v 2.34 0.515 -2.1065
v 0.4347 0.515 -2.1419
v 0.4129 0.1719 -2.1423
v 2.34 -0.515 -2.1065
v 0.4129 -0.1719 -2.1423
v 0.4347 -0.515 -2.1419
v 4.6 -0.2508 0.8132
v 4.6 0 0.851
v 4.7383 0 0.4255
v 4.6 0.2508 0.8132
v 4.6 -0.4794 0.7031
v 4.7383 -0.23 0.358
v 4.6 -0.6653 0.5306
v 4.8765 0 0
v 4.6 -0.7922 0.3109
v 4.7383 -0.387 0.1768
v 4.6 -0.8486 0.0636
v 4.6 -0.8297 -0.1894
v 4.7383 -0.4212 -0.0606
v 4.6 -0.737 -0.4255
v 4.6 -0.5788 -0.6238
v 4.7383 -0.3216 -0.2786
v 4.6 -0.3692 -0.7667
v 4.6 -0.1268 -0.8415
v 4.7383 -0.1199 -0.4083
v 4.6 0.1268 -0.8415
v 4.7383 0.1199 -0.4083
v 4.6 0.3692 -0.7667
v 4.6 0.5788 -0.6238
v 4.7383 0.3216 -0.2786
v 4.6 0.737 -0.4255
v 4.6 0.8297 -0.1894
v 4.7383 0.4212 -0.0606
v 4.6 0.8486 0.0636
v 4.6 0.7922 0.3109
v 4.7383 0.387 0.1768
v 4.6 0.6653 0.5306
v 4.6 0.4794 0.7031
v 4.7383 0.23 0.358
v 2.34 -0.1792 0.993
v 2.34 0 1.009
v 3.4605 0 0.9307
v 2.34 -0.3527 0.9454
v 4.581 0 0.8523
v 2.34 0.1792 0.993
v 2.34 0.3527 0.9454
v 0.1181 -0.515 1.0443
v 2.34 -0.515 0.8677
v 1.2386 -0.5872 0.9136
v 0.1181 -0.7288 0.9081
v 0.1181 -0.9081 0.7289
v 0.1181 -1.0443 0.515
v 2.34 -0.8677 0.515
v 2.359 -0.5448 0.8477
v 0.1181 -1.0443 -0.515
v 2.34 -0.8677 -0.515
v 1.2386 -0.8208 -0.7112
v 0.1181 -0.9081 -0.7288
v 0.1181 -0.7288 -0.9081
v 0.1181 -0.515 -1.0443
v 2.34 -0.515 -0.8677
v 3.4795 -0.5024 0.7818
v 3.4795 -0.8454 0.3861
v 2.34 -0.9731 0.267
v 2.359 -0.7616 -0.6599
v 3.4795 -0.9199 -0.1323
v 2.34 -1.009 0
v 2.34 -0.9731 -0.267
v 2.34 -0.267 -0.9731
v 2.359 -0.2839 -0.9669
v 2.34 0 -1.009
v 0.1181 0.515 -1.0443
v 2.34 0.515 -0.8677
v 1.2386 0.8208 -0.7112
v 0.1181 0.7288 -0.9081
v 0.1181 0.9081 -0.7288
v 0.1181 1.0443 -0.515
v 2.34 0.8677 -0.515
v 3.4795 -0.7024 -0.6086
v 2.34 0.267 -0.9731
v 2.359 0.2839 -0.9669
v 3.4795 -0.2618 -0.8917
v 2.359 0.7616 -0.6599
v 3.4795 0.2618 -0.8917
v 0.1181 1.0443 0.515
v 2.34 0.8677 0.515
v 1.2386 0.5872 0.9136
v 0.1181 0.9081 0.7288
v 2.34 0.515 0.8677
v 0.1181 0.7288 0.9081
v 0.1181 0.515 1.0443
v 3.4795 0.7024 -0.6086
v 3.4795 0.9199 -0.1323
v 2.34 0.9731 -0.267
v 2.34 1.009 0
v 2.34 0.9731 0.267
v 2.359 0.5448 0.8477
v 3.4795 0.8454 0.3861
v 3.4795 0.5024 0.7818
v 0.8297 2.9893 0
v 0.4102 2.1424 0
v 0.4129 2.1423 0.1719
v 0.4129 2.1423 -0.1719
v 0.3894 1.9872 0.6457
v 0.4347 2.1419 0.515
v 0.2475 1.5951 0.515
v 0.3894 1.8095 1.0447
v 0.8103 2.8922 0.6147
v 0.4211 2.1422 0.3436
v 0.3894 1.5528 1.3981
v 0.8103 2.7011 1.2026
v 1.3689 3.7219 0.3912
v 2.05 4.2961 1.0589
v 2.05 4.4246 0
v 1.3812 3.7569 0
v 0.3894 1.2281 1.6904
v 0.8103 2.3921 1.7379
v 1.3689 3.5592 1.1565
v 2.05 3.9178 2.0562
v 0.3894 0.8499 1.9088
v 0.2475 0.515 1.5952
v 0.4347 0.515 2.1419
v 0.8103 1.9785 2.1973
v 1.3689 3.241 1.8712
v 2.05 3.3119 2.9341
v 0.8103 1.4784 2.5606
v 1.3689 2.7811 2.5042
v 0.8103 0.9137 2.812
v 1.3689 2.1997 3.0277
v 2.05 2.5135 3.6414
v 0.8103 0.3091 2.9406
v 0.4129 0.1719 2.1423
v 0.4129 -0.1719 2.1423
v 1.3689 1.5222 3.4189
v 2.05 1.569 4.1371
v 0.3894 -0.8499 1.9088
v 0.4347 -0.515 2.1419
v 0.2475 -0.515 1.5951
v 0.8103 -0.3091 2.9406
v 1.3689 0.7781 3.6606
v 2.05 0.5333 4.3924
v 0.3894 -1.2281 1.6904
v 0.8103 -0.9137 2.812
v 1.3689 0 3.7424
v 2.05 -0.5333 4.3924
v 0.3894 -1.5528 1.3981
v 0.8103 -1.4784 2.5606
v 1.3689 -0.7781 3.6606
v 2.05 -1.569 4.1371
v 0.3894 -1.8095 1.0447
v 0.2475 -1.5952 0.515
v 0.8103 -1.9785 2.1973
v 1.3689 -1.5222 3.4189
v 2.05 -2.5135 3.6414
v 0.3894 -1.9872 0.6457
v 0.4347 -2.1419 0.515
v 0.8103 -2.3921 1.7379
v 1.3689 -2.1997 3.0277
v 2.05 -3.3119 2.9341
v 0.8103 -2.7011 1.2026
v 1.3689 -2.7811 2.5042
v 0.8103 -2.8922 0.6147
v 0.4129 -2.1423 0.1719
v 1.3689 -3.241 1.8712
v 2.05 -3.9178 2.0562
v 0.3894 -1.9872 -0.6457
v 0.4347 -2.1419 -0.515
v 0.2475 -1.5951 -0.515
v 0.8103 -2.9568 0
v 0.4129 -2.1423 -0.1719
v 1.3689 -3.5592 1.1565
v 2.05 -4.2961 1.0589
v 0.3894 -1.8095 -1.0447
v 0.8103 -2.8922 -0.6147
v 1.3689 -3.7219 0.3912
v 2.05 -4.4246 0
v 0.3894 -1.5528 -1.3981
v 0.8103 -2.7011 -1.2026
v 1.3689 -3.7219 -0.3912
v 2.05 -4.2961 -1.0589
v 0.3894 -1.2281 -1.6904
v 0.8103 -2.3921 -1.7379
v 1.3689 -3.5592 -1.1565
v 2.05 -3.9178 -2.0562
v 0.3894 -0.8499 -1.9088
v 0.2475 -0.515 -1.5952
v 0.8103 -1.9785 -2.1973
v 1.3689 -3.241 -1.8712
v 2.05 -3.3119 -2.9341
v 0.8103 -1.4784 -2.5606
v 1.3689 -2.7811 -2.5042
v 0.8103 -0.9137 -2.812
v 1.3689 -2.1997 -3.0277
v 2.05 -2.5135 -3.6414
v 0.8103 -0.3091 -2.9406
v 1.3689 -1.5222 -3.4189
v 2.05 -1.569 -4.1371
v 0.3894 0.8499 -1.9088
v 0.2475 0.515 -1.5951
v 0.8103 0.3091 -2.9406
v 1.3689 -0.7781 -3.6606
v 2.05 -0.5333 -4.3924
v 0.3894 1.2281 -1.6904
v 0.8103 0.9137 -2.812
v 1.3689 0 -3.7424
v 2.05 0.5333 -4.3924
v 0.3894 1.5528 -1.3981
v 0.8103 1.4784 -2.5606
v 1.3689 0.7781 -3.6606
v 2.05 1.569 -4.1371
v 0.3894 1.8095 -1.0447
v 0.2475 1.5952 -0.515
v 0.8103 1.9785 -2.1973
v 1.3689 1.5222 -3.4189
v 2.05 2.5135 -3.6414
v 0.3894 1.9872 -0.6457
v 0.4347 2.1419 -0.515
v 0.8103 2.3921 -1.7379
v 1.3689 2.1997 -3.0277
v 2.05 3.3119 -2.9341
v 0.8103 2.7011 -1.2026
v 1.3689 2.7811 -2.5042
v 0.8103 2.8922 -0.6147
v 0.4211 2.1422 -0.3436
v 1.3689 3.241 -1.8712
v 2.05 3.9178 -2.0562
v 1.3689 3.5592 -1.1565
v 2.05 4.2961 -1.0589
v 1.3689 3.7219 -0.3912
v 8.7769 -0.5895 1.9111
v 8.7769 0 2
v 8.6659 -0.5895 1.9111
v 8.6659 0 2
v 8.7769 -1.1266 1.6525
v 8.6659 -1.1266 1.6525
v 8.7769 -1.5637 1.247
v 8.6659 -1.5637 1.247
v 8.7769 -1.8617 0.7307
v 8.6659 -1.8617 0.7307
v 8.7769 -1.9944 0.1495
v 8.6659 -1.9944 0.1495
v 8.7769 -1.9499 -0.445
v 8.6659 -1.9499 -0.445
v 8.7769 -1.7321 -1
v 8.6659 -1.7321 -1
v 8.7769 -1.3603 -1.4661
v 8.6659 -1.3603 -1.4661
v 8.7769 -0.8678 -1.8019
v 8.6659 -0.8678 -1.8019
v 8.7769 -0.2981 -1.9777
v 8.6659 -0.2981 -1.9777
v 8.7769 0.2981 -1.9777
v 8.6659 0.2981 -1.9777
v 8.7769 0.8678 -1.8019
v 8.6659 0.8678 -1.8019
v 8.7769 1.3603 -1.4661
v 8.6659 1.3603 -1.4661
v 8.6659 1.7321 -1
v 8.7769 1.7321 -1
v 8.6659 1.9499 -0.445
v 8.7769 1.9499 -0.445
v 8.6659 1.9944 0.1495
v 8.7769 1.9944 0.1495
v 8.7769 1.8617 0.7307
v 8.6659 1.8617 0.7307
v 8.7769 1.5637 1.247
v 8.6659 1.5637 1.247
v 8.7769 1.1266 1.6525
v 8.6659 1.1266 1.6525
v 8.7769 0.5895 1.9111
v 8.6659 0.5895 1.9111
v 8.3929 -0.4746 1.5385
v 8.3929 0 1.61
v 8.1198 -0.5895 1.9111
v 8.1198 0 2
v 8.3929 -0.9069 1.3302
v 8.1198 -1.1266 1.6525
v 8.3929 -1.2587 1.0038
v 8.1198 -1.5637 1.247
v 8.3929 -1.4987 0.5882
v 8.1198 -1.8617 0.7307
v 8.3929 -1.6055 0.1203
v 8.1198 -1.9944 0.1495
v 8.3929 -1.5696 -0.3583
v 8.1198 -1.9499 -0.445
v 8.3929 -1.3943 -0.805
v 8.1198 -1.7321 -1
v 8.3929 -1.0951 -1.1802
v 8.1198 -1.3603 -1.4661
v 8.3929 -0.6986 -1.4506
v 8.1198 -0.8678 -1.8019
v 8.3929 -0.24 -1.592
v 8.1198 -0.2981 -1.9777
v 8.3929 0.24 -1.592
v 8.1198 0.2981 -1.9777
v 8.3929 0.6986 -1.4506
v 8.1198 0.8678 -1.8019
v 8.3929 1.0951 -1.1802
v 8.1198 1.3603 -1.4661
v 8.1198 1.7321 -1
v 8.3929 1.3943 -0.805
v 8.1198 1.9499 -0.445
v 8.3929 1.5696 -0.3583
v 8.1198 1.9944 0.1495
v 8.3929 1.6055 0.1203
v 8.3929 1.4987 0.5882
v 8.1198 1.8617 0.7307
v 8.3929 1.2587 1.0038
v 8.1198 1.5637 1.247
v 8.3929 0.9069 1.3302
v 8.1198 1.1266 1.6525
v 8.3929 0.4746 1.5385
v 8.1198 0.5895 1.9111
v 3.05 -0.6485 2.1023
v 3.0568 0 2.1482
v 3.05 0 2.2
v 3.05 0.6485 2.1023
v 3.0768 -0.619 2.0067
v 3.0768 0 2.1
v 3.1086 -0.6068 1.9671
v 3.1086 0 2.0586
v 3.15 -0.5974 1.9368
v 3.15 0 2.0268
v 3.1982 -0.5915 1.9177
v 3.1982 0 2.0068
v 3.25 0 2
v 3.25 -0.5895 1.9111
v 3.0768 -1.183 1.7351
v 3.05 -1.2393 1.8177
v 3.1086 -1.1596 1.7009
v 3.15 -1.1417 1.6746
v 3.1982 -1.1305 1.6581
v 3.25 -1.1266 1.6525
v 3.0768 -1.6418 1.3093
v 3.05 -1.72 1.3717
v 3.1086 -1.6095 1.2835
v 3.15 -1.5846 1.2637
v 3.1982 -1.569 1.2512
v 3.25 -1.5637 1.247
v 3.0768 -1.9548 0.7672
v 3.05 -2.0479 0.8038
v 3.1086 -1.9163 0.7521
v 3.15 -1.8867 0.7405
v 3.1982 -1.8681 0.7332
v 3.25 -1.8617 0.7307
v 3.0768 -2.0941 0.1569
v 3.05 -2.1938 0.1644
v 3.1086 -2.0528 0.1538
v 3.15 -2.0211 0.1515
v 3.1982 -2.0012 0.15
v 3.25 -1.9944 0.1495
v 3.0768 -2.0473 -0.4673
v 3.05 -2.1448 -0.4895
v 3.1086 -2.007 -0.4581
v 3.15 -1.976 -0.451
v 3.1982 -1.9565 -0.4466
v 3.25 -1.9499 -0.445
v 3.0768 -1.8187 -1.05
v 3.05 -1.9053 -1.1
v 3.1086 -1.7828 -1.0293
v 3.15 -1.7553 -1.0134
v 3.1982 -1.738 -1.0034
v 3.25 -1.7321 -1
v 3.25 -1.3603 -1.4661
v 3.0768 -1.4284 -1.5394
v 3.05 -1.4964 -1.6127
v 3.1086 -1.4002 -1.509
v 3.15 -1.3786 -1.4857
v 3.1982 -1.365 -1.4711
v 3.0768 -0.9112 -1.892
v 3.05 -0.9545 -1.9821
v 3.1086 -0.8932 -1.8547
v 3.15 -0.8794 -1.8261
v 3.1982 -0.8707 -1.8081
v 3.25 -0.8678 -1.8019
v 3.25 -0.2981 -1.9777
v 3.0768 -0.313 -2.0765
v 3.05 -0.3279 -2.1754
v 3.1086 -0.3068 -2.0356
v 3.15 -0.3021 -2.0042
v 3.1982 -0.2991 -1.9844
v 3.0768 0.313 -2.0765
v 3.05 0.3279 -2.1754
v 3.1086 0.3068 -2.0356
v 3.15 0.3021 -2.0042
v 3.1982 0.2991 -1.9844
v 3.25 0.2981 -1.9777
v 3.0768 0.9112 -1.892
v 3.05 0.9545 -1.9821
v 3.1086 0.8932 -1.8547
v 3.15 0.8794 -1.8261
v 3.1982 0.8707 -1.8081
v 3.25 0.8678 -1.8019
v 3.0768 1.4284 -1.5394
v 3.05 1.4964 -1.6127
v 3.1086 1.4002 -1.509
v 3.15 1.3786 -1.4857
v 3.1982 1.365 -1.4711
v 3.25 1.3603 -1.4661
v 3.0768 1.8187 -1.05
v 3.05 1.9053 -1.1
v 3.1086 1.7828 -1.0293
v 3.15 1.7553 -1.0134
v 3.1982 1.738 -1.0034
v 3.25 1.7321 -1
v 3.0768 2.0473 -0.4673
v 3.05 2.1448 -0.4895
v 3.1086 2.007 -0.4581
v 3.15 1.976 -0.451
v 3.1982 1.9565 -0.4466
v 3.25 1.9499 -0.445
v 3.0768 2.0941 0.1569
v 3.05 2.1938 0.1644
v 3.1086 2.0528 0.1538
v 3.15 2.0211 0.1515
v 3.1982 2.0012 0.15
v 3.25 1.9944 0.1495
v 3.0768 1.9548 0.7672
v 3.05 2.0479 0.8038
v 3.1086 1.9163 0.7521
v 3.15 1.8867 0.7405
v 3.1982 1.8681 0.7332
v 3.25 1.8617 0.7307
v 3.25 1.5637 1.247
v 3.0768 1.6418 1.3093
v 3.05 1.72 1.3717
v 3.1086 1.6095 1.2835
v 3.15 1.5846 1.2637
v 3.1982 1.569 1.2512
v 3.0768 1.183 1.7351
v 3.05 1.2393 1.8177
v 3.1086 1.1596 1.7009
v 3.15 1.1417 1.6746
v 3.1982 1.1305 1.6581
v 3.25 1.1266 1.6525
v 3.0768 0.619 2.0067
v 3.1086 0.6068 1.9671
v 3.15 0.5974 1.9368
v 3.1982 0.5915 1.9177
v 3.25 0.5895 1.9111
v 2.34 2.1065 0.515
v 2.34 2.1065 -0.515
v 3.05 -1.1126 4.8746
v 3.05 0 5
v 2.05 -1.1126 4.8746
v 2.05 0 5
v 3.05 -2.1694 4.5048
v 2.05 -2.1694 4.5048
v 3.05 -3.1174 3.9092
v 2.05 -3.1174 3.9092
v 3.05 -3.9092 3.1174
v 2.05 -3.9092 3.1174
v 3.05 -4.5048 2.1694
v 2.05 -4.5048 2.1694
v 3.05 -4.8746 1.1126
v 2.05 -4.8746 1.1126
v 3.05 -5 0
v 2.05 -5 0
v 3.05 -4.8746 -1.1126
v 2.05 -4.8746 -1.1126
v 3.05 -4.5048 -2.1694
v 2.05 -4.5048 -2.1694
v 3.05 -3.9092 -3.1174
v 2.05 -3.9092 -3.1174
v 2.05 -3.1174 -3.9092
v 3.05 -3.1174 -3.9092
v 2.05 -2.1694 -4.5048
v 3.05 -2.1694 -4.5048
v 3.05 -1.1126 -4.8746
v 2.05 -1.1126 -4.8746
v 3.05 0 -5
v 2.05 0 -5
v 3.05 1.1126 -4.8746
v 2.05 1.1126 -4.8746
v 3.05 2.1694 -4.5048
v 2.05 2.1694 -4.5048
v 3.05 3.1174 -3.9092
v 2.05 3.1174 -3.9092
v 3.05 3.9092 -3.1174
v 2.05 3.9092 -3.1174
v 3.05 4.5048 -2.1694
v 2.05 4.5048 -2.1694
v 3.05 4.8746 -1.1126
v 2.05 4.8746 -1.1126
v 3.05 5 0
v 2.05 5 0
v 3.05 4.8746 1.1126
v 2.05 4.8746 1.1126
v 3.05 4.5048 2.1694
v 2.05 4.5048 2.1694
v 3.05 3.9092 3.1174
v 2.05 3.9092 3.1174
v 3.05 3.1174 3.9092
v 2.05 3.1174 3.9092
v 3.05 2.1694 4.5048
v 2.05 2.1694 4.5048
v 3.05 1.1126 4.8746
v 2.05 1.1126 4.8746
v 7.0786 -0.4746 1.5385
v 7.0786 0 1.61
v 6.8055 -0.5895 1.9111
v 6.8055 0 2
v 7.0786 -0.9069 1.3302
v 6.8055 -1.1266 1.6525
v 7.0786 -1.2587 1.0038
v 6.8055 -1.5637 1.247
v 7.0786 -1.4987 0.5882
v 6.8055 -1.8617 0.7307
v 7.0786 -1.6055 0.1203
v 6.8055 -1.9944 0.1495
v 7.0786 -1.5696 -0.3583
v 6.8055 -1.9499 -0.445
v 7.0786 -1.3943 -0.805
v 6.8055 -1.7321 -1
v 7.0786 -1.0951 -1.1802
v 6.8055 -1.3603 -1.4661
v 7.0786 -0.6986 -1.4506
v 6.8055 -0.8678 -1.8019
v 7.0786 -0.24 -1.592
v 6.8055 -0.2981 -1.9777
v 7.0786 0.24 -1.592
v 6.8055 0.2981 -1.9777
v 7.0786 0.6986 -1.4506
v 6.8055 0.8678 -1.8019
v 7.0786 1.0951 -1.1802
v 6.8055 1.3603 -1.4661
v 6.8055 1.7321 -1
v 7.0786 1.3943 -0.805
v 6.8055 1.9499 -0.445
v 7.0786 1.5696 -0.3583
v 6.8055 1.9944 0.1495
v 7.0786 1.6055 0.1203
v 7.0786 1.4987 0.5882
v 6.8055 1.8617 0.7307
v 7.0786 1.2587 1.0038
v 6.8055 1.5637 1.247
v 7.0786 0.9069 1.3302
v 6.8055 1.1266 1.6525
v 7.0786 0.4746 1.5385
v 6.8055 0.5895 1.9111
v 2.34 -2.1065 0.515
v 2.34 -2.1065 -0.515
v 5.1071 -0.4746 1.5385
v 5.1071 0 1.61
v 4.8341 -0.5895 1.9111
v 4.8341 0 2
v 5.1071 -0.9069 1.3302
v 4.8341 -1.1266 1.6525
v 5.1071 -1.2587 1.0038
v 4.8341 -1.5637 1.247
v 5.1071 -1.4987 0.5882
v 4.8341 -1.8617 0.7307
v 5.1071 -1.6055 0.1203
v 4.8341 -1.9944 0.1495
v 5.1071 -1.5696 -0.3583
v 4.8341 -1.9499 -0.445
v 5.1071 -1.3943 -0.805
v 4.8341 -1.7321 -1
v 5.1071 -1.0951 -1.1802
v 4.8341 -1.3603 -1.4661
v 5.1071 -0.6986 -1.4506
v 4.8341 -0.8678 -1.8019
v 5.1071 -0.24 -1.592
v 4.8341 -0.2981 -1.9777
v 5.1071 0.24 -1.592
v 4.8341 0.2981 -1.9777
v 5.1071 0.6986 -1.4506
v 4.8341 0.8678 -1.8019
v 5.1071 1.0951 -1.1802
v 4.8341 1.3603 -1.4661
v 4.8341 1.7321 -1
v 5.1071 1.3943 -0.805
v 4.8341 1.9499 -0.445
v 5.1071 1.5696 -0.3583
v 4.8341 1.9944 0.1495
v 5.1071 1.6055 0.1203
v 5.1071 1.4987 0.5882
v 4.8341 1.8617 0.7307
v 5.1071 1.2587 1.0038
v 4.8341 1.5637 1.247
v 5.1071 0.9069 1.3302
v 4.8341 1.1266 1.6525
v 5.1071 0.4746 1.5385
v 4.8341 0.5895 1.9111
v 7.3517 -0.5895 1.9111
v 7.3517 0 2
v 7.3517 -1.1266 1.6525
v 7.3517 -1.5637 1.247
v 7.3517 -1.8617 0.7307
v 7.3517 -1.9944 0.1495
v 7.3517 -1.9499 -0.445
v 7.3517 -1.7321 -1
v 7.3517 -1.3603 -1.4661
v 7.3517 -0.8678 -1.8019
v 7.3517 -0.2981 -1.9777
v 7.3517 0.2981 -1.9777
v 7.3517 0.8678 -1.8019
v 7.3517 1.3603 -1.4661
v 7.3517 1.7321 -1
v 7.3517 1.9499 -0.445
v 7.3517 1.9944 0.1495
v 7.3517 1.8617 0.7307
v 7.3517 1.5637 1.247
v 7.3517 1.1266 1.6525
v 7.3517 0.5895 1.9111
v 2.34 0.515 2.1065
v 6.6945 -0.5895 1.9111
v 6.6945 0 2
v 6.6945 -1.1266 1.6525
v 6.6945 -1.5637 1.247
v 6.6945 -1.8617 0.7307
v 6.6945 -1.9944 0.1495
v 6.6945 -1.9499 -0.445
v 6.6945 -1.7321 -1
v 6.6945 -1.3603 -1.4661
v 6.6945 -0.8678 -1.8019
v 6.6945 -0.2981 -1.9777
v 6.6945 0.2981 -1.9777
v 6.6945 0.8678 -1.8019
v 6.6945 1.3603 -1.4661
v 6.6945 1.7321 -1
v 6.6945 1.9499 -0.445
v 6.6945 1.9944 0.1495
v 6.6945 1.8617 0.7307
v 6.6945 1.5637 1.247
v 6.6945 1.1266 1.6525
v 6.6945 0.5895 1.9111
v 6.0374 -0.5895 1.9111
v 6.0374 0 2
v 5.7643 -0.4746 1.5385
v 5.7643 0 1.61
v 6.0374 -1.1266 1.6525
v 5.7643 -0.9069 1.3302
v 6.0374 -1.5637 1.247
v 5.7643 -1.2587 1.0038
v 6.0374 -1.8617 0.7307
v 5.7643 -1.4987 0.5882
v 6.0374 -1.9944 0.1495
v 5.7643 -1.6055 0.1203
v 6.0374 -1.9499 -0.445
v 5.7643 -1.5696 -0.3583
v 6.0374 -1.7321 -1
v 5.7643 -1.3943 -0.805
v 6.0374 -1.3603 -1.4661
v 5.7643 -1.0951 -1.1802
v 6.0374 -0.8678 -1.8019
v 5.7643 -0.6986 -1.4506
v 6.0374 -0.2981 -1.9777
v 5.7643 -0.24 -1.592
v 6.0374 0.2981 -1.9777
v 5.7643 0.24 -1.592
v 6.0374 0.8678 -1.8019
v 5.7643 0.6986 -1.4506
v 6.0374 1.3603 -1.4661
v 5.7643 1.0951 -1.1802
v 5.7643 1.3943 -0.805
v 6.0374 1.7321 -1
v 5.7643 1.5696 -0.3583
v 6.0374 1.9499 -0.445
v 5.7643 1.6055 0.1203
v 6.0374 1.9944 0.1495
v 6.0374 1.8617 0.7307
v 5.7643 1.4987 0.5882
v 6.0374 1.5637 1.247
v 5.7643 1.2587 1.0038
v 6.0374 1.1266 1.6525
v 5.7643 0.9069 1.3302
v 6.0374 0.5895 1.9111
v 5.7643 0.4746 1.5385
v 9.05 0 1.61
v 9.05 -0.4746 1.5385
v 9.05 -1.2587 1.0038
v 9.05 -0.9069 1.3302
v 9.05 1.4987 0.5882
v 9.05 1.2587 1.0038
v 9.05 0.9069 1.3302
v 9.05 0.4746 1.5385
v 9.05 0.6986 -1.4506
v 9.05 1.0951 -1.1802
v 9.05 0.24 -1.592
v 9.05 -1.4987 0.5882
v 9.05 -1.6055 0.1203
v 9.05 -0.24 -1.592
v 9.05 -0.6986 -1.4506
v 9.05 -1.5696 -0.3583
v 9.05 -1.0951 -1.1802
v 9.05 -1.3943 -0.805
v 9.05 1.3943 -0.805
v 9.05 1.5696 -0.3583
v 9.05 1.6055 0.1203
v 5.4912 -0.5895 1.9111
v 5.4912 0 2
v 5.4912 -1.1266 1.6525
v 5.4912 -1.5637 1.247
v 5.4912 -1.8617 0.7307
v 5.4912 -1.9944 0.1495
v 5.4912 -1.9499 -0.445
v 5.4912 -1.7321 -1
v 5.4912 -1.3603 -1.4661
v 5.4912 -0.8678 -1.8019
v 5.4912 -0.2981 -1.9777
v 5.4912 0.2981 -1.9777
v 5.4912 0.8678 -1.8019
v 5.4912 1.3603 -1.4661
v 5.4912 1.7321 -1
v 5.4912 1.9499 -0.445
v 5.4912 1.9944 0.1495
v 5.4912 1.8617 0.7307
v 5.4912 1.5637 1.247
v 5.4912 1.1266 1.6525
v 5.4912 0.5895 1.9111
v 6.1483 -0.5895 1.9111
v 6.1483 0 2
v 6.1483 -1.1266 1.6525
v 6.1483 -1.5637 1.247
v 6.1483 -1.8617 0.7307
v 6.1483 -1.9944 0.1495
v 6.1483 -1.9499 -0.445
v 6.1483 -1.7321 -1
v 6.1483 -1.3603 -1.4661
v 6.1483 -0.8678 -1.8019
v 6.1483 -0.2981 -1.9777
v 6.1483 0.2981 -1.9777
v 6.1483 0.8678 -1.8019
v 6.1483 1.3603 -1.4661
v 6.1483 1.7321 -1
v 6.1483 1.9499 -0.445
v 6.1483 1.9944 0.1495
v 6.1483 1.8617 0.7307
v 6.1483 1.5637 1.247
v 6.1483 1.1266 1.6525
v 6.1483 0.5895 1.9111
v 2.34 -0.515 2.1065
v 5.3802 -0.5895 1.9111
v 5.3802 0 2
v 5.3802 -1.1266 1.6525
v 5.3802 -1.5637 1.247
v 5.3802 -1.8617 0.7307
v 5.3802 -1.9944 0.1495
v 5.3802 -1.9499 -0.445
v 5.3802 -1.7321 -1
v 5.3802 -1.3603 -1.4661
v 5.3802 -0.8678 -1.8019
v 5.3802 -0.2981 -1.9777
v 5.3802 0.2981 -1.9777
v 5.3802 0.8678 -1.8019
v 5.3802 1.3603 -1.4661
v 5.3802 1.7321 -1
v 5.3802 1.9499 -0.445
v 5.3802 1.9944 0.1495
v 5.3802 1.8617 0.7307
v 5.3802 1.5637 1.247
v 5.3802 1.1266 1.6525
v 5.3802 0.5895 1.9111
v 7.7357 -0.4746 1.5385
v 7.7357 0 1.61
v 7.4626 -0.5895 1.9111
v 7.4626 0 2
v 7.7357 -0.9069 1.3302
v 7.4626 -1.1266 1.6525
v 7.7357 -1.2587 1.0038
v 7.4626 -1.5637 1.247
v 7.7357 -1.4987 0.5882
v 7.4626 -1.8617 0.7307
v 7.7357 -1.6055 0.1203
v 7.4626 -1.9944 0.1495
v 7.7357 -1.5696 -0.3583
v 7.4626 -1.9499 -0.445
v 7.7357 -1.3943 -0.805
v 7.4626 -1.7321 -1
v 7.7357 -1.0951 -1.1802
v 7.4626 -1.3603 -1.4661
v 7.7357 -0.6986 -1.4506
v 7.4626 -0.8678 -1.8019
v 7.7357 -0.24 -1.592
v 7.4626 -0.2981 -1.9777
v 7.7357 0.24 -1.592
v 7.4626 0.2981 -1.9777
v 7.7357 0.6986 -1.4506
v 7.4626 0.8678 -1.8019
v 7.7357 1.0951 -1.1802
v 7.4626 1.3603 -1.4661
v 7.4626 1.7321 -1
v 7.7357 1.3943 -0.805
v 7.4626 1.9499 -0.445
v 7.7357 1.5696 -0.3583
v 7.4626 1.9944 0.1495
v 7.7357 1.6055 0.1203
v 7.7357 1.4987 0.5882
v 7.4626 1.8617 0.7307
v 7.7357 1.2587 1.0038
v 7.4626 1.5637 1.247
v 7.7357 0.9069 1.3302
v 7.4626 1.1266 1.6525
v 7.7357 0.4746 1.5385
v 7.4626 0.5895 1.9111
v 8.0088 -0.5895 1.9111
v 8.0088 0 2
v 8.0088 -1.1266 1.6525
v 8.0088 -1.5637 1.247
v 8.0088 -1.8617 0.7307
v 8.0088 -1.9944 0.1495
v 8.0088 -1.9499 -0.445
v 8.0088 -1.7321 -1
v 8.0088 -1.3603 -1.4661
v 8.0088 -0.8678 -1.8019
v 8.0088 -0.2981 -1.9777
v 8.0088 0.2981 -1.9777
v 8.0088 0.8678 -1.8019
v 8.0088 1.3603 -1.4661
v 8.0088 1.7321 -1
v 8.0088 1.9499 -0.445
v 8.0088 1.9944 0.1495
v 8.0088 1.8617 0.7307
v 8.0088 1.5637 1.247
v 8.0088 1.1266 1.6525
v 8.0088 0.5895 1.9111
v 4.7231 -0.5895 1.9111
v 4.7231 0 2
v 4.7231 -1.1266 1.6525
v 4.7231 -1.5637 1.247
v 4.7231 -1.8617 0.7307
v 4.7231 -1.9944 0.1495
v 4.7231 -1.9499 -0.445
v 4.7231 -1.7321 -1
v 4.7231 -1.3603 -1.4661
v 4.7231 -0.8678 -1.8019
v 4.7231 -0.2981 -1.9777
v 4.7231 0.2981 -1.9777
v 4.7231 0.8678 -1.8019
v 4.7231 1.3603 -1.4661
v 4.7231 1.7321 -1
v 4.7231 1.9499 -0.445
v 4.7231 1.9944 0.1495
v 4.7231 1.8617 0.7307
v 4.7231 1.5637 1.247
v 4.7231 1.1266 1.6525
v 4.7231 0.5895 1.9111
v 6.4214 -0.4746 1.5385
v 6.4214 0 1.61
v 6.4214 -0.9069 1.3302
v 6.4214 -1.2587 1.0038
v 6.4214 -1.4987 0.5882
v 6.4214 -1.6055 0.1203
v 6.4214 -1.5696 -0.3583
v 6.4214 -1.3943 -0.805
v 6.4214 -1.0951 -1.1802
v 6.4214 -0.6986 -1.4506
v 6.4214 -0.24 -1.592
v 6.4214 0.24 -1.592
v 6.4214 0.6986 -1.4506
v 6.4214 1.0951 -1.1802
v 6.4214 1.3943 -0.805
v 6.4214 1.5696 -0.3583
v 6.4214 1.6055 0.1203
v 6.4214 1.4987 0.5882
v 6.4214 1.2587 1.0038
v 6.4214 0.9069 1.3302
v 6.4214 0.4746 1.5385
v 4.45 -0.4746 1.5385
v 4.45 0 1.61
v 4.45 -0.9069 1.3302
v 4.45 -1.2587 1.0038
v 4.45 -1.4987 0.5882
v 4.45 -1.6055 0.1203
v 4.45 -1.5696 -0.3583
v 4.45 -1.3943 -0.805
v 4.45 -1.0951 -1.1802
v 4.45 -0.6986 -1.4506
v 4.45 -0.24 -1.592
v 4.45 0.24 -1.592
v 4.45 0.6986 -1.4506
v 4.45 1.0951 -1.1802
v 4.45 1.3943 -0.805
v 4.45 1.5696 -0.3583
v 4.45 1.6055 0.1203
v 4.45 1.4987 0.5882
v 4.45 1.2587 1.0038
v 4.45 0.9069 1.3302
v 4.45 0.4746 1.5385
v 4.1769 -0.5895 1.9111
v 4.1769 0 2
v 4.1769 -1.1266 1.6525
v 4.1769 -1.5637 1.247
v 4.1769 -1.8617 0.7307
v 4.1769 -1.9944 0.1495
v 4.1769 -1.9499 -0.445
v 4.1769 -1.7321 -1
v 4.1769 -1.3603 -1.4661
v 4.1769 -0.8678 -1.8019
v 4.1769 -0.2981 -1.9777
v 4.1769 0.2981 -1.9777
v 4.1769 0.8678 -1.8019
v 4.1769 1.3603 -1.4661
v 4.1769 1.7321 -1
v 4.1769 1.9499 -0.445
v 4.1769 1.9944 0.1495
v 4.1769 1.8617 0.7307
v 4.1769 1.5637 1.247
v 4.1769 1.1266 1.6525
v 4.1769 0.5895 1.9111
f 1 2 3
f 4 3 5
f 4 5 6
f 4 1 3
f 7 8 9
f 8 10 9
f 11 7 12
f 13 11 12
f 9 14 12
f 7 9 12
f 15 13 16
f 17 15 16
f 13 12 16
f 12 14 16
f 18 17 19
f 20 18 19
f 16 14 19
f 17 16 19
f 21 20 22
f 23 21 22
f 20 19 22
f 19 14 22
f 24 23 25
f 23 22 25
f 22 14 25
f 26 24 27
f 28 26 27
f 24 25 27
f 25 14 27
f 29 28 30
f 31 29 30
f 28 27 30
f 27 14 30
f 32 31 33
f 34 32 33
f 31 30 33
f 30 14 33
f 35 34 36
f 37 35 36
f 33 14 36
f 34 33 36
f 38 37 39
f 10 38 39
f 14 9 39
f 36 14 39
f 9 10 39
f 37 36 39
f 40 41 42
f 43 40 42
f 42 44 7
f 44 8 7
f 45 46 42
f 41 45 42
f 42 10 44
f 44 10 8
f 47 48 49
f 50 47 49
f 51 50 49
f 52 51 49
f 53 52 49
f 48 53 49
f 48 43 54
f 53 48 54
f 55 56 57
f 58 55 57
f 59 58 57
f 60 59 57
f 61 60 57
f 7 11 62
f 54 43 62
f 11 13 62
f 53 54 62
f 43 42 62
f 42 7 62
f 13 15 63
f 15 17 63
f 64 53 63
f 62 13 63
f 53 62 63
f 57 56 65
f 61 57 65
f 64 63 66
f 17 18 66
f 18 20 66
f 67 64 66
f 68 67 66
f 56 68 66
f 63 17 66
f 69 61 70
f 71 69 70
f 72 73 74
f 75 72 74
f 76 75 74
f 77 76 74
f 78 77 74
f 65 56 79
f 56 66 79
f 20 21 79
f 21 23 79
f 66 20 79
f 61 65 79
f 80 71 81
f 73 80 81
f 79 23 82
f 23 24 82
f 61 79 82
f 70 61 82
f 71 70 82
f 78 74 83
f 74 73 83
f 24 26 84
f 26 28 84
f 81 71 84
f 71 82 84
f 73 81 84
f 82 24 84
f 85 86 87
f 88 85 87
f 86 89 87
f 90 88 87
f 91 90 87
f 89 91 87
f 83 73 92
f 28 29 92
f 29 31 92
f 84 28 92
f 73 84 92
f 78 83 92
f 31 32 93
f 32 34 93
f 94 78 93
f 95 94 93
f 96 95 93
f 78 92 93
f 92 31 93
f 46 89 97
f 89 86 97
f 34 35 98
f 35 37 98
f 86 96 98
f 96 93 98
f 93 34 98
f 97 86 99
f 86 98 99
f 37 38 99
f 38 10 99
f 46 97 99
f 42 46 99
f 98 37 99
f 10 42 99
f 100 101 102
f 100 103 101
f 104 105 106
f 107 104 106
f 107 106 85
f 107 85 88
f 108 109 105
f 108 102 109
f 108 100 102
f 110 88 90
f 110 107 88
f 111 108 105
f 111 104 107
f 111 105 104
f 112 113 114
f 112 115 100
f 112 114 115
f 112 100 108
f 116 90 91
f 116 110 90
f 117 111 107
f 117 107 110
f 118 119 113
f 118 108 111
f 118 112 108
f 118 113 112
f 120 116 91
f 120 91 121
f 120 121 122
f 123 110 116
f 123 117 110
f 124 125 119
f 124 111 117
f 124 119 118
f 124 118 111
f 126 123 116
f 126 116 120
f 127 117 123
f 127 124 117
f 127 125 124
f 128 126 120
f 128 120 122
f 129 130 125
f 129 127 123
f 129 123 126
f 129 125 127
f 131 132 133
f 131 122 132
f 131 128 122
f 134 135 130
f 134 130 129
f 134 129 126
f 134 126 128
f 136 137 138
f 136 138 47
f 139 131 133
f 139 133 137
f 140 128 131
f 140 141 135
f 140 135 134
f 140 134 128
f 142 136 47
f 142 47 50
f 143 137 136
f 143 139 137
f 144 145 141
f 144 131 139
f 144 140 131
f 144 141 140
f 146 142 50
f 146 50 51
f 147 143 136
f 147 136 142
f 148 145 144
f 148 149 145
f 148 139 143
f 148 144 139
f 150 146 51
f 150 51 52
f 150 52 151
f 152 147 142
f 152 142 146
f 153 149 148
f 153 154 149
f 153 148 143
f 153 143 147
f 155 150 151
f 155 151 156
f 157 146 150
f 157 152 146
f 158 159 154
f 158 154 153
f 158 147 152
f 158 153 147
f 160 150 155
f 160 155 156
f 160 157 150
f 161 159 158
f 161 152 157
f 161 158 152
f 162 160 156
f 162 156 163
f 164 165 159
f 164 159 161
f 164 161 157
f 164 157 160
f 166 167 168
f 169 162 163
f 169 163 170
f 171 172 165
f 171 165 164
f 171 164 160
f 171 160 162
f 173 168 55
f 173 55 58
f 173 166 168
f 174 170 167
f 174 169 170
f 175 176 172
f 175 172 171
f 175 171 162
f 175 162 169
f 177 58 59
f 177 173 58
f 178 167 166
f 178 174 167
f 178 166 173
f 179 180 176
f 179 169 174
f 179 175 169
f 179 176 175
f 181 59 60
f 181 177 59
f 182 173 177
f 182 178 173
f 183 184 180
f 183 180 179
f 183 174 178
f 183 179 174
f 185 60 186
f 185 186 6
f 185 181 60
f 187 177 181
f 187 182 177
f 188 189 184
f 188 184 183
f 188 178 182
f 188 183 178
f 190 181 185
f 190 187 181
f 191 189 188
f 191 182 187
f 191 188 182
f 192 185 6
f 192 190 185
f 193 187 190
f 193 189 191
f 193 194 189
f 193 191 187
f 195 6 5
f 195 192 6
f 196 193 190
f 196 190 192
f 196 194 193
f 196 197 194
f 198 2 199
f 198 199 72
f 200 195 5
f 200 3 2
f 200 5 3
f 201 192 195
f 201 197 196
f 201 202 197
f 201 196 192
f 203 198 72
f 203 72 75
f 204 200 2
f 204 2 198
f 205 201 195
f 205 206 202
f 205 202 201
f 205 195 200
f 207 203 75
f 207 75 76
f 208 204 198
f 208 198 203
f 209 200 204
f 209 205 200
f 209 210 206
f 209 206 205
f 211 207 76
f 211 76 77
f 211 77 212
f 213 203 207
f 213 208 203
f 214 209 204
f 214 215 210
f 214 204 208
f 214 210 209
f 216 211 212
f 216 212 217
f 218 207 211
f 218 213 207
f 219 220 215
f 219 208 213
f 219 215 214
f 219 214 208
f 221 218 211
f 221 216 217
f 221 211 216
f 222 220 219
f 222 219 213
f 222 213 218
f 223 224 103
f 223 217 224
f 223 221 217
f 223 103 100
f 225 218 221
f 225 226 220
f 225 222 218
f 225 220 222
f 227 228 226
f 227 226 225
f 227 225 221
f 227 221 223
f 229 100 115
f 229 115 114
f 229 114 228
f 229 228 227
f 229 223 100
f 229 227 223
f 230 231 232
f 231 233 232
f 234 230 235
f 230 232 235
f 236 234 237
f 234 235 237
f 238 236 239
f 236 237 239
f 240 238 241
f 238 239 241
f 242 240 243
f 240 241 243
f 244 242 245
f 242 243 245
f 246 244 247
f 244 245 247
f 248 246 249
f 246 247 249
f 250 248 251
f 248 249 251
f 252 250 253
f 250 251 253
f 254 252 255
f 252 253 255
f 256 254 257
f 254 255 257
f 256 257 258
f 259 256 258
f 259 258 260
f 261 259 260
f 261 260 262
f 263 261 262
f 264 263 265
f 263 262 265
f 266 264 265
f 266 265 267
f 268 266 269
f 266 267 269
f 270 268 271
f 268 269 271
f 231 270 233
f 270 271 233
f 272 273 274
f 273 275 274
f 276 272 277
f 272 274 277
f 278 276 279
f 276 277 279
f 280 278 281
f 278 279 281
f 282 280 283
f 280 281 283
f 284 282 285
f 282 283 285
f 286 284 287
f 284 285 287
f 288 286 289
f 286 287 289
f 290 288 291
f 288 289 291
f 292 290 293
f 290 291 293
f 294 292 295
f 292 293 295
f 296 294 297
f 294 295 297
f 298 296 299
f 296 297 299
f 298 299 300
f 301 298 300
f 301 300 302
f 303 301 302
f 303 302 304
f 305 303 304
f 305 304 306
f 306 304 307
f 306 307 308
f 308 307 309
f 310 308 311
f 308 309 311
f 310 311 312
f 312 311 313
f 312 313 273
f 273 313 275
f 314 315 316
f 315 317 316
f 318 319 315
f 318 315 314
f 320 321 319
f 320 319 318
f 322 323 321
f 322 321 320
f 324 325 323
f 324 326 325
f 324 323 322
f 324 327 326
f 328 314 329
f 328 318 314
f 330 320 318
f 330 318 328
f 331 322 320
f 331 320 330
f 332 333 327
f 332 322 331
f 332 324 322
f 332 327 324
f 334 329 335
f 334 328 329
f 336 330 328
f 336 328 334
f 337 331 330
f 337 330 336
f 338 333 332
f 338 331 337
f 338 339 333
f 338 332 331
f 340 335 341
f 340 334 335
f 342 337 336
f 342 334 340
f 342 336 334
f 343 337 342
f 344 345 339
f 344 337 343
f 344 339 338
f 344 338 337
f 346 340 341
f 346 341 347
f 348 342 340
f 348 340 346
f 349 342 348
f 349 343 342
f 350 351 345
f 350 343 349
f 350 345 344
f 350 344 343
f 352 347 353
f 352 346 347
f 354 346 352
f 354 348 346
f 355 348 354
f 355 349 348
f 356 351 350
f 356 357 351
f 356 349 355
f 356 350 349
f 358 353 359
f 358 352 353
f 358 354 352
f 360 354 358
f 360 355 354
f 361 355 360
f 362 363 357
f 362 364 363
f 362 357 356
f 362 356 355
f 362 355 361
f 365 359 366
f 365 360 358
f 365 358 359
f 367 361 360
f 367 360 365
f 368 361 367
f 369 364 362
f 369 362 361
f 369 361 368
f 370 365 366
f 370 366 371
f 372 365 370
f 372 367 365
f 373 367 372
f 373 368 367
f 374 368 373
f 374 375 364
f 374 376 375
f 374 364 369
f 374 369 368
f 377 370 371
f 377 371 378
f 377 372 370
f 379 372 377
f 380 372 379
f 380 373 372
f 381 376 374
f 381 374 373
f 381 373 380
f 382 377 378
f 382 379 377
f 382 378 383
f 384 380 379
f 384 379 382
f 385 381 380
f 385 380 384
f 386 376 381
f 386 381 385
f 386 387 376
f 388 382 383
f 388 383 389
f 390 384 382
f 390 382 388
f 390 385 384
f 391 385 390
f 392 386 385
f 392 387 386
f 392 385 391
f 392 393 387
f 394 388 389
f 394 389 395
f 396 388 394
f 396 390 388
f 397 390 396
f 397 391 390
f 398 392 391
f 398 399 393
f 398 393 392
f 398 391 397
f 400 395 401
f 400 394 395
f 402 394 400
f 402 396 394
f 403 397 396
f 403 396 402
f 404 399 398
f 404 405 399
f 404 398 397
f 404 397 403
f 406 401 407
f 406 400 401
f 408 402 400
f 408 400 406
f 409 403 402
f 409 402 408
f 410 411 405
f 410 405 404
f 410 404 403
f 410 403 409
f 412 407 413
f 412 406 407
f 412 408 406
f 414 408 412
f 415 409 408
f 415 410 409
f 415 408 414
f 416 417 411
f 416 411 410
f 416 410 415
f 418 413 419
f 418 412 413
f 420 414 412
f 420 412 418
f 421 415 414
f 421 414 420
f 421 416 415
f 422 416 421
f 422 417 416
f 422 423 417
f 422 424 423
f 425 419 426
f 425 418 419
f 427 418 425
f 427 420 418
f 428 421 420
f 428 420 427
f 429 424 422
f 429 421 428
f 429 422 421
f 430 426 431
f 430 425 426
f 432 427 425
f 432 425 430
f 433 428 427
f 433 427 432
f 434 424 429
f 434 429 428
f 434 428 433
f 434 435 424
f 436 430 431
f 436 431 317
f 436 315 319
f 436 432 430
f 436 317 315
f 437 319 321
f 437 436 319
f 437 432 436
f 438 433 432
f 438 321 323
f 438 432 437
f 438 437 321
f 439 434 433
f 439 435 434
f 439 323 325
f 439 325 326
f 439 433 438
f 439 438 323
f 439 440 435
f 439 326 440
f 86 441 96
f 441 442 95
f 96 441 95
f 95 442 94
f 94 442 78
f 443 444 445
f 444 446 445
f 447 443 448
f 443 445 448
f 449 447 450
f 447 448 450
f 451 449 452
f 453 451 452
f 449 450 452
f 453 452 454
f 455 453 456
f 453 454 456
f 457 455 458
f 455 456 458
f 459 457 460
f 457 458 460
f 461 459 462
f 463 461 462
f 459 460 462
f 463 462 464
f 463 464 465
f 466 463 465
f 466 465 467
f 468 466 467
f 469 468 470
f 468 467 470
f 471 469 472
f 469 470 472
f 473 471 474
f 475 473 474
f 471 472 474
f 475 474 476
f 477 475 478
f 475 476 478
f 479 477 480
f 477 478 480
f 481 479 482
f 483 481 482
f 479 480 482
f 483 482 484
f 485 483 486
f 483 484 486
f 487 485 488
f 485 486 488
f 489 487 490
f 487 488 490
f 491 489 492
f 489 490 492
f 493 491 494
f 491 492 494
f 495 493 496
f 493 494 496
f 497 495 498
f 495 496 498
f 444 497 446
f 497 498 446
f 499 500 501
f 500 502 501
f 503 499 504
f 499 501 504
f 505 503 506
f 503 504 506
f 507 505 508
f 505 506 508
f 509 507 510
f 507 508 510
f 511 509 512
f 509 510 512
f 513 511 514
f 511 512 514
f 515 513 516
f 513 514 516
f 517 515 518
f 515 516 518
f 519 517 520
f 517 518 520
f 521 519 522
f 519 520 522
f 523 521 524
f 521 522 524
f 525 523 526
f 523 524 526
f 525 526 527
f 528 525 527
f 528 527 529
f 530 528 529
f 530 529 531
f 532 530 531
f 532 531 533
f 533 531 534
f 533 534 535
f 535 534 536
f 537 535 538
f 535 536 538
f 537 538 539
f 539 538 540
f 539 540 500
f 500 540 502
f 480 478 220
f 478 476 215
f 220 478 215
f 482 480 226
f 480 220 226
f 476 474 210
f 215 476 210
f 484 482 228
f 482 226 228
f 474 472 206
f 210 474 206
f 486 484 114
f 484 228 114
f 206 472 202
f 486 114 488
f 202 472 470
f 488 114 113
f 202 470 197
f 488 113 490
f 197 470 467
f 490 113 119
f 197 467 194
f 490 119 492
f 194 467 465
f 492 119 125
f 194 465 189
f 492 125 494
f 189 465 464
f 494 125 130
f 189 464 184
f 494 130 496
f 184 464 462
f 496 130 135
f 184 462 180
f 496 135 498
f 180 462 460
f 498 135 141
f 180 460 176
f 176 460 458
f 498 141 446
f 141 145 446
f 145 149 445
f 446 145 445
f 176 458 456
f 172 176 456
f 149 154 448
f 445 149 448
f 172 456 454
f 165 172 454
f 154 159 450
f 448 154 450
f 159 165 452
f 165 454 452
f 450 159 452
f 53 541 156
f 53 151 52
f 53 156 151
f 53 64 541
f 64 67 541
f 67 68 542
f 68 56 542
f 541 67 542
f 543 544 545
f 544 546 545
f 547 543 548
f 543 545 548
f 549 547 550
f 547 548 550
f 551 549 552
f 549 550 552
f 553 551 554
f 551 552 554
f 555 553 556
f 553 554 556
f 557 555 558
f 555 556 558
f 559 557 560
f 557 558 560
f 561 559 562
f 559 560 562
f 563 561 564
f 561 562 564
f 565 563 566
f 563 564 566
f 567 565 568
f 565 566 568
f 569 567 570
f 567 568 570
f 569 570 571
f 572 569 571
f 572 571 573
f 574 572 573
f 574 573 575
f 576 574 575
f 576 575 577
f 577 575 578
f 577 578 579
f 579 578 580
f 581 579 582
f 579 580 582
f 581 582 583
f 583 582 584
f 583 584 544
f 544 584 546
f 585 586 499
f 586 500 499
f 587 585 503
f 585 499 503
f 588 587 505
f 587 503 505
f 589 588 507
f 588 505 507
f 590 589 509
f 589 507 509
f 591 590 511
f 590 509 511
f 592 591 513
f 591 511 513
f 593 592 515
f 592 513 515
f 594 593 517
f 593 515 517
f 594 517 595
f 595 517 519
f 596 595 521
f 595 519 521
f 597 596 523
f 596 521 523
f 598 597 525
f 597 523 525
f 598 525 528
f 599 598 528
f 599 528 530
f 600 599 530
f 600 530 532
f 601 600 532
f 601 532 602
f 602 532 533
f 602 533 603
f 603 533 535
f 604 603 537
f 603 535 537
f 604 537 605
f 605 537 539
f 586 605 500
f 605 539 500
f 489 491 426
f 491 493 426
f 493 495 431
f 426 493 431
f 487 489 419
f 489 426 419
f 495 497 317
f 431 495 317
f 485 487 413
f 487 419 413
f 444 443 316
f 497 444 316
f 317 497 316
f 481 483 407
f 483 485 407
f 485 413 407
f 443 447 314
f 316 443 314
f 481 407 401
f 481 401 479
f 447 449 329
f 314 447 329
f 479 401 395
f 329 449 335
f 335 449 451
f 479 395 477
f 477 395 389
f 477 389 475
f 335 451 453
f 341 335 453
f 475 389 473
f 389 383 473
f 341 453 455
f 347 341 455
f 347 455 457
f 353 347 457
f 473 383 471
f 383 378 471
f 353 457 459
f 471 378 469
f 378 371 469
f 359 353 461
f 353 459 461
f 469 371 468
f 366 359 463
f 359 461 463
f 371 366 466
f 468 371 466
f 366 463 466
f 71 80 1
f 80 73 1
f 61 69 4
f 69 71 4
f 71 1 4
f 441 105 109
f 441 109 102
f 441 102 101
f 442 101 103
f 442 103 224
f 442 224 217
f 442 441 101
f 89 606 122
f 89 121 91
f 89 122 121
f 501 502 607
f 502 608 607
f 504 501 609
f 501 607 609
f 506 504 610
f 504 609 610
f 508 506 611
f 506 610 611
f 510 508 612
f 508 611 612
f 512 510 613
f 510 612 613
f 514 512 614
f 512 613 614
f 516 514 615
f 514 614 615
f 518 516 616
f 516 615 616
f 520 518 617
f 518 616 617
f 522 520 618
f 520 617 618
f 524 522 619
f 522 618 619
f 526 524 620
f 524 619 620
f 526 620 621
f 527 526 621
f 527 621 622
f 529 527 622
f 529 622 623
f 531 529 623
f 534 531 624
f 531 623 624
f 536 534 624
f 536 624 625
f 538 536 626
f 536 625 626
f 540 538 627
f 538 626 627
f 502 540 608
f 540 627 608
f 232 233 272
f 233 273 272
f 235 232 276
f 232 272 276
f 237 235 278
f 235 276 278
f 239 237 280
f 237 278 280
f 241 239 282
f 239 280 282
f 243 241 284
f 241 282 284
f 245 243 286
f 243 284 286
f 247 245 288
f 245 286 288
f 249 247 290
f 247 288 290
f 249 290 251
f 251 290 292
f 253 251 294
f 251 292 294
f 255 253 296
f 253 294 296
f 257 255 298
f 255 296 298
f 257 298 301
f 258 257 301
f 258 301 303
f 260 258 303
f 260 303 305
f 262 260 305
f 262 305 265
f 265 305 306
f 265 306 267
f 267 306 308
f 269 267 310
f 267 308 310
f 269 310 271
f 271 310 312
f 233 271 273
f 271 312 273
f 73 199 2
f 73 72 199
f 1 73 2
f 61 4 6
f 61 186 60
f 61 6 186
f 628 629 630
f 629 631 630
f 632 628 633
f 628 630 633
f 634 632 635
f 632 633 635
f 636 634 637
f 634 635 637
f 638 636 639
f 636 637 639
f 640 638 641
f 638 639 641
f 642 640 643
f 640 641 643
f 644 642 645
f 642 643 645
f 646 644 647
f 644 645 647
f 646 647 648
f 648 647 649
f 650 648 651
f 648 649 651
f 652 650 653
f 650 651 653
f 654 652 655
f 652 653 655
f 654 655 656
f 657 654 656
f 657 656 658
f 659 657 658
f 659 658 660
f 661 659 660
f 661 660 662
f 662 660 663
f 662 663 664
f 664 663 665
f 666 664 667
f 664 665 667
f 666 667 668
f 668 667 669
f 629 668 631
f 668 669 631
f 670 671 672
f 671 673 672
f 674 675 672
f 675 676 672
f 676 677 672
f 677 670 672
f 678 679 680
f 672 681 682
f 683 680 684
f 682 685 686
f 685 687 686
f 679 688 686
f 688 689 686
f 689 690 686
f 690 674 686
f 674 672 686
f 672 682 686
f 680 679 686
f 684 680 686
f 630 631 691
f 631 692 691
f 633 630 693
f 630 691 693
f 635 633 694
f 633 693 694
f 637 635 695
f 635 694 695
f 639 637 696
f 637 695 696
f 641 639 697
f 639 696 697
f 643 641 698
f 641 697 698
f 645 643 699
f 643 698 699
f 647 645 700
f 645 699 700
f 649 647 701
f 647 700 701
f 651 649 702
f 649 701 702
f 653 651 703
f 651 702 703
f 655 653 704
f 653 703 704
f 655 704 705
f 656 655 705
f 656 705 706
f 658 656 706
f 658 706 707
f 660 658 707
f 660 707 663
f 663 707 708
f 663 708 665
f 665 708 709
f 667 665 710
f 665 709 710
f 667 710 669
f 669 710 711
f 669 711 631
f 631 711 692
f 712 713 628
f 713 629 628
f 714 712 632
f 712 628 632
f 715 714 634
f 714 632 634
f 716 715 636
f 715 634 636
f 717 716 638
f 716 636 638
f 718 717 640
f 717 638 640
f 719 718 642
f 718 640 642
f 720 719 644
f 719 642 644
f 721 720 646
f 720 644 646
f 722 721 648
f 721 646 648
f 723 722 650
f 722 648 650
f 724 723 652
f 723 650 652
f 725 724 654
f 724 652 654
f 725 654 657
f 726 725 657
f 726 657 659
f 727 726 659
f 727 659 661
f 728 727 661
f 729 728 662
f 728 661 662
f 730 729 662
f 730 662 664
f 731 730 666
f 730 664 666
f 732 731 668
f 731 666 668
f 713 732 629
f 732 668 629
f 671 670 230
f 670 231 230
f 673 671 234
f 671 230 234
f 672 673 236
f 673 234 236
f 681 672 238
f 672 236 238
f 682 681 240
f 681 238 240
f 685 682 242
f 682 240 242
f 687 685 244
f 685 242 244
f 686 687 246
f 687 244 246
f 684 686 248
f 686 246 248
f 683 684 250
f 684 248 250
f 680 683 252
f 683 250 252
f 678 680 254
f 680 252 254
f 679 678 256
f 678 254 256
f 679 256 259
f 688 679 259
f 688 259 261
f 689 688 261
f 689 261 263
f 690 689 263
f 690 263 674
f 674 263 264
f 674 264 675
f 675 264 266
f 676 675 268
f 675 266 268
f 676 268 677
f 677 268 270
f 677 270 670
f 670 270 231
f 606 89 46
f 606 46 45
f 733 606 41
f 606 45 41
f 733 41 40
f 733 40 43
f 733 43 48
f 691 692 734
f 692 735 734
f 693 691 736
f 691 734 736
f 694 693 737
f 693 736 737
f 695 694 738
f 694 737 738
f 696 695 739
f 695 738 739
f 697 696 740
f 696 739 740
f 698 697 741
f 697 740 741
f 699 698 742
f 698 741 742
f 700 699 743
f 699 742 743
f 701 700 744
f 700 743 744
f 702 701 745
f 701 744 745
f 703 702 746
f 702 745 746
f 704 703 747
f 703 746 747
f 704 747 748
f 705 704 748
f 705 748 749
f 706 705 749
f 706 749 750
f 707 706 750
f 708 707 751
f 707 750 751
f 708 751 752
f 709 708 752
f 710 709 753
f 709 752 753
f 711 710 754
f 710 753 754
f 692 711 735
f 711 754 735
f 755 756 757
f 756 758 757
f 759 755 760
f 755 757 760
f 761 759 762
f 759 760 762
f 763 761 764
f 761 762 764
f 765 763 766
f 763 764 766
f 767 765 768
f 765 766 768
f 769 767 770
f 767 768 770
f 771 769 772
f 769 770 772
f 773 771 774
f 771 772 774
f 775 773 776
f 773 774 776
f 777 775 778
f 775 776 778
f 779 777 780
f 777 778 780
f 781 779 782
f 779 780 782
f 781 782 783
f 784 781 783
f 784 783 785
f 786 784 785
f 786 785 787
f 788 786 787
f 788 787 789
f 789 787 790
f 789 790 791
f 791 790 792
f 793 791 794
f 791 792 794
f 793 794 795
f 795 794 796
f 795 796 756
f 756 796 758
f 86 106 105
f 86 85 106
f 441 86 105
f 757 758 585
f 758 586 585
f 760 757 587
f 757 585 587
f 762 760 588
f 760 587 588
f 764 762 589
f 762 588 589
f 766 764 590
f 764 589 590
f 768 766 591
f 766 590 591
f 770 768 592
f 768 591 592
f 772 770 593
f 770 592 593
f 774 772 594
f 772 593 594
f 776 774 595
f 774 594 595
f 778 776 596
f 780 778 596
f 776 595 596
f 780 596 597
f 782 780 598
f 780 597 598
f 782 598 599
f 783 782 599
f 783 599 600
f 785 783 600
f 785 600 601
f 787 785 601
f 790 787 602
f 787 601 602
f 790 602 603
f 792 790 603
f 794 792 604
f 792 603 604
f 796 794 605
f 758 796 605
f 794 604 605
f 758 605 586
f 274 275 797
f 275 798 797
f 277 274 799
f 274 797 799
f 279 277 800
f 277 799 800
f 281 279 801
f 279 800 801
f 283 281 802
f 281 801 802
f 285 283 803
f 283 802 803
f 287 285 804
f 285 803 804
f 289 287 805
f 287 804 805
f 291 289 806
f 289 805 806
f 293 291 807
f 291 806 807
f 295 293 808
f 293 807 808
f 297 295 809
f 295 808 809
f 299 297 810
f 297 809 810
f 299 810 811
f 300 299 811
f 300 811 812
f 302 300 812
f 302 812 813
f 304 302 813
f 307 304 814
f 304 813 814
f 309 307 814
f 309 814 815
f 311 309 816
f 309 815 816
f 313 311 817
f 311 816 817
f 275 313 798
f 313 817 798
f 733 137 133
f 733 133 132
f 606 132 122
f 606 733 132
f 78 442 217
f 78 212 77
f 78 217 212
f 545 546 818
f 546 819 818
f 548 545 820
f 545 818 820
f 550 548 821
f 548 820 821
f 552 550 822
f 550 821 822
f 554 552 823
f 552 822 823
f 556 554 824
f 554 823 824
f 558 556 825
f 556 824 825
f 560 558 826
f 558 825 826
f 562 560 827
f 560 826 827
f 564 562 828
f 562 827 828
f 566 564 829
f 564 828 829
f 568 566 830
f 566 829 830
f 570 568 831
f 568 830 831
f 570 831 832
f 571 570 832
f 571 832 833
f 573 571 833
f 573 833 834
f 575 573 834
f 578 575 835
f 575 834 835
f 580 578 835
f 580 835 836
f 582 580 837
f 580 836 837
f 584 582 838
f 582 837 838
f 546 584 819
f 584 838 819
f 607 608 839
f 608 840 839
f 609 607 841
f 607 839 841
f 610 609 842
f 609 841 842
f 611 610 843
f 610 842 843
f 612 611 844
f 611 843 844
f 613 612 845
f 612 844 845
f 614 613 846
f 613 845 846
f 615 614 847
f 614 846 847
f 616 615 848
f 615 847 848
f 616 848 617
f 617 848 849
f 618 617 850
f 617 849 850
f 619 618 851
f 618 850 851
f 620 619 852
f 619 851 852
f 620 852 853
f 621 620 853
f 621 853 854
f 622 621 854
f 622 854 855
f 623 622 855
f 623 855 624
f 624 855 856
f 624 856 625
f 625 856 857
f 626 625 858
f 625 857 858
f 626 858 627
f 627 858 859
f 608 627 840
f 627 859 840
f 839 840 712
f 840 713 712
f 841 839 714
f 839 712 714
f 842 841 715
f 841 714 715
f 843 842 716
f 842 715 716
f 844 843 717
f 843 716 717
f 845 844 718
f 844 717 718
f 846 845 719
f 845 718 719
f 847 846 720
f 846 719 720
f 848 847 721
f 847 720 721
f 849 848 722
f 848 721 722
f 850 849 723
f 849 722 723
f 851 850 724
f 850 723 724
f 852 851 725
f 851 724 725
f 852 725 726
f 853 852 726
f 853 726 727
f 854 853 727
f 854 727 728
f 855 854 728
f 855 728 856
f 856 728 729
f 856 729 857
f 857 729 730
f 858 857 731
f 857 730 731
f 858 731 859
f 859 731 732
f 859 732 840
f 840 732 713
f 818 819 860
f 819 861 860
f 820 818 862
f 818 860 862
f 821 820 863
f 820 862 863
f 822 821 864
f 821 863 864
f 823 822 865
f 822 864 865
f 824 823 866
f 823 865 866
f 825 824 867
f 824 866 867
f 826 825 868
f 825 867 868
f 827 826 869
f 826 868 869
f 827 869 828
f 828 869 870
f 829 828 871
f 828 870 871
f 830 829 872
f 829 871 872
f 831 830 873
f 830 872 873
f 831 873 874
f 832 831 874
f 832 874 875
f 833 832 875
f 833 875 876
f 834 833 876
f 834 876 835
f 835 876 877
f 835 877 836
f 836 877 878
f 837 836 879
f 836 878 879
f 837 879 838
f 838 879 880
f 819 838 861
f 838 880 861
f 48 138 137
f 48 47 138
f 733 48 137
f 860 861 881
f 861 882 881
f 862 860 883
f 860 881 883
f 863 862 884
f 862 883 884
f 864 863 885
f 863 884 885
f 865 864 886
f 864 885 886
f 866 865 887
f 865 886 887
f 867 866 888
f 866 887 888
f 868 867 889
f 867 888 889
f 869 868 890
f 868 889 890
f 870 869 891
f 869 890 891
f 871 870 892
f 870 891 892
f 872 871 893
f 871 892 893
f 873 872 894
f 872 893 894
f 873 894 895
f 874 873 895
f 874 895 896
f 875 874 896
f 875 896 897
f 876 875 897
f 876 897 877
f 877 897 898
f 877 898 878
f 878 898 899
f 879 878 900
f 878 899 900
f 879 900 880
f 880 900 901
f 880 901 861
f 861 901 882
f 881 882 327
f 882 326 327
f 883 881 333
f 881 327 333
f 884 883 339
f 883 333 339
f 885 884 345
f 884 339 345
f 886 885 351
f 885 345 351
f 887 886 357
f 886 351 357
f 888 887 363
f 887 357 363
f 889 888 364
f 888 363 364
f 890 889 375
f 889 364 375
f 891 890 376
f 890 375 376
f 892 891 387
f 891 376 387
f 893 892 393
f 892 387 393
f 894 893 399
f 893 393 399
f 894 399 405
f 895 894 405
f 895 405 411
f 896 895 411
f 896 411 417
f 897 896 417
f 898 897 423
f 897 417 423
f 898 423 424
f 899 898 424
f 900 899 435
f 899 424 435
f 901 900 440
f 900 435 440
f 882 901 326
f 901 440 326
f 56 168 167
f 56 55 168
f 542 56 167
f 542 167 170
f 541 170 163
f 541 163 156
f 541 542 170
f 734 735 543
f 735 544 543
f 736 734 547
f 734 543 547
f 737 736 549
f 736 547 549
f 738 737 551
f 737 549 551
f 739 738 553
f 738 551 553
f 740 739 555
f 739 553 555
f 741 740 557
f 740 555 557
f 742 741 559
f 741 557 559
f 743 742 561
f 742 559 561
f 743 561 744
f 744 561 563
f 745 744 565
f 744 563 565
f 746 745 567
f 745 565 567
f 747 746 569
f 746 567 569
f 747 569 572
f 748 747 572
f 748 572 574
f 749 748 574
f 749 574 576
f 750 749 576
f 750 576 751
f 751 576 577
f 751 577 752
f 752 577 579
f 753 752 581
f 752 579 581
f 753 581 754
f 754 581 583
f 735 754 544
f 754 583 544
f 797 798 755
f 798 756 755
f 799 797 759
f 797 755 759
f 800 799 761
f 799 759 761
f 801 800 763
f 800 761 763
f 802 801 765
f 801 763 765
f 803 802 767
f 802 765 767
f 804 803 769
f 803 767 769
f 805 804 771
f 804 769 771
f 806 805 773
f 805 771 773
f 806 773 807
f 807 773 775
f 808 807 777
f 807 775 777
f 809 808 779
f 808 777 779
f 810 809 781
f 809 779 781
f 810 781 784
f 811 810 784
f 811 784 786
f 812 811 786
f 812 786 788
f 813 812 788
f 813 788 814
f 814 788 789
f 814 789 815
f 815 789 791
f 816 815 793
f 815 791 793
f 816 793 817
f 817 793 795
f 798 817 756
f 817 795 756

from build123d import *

# Parameters (mm, degrees)
FILLET1_R       = 0.2
RECPAT_COUNT    = 2
RECPAT_ANGLE    = 90
THDSCHPAT_COUNT = 8
THDSCHPAT_PITCH = 0.657142857


with BuildPart() as part:
    # BodySke → Base-Revolve (revolve)
    with BuildSketch(Plane.XY, mode=Mode.PRIVATE) as base_revolve_sk:
        Polygon((3.05, 2), (3.05, 5), (2.05, 5), (2.05, 0), (9.05, 0), (9.05, 2), align=None)
    revolve(base_revolve_sk.sketch.rotate(Axis((-6.35, 0, 0), (1, 0, 0)), 90), axis=Axis((-6.35, 0, 0), (1, 0, 0)))

    # Fillet1
    fillet1_edges = [part.edges().sort_by_distance(p)[0] for p in [
        (3.05, 0, -2),
    ]]
    fillet(fillet1_edges, radius=FILLET1_R)

    # PanSke → Pan (revolve)
    with BuildSketch(Plane.XY):
        with BuildLine():
            Line((2.05, 4.424646879), (2.05, 0))
            Line((2.05, 0), (0, 0))
            ThreePointArc((0, 0), (0.537396082, 2.438237068), (2.05, 4.424646879))
        make_face()
    revolve(axis=Axis((0, 0, 0), (1, 0, 0)))

    # Sketch3 → Recess section 0
    with BuildSketch(Plane(origin=(0, 0, 0), x_dir=(0, 0, -1), z_dir=(1, 0, 0))):
        with BuildLine():
            Line((-0.515, 2.15), (0.515, 2.15))
            Line((0.515, 2.15), (0.515, -2.15))
            Line((0.515, -2.15), (-0.515, -2.15))
            Line((-0.515, -2.15), (-0.515, 2.15))
        make_face()
    # Sketch4 → Recess section 1
    with BuildSketch(Plane(origin=(2.34, 0, 0), x_dir=(0, 0, -1), z_dir=(1, 0, 0))):
        with BuildLine():
            Line((-0.515, 2.106524682), (0.515, 2.106524682))
            Line((0.515, 2.106524682), (0.515, -2.106524682))
            Line((0.515, -2.106524682), (-0.515, -2.106524682))
            Line((-0.515, -2.106524682), (-0.515, 2.106524682))
        make_face()
    recess = loft(mode=Mode.SUBTRACT)

    # RecPat: Recess ×2 about axis
    recpat_axis = Axis((0, 0, 0), (1, 0, 0))
    for i in range(1, RECPAT_COUNT):
        add(recess.rotate(recpat_axis, i * RECPAT_ANGLE / (RECPAT_COUNT - 1)), mode=Mode.SUBTRACT)

    # RecCorSke → RecessCore (revolve, cut)
    with BuildSketch(Plane.XY, mode=Mode.PRIVATE) as recesscore_sk:
        Polygon((0, 0), (0, 1.172663335), (4.6, 0.851), (4.876506661, 0), align=None)
    revolve(recesscore_sk.sketch.rotate(Axis((-3.175, 0, 0), (1, 0, 0)), 90), axis=Axis((-3.175, 0, 0), (1, 0, 0)), mode=Mode.SUBTRACT)

    # ThdSchSke → ThreadSchematic (revolve, cut)
    with BuildSketch(Plane.XY, mode=Mode.PRIVATE) as threadschematic_sk:
        Polygon((4.45, -1.61), (4.17691906, -2), (4.17691906, -2.5), (4.72308094, -2.5), (4.72308094, -2), align=None)
    threadschematic = revolve(threadschematic_sk.sketch.rotate(Axis((-3.175, 0, 0), (1, 0, 0)), 270), axis=Axis((-3.175, 0, 0), (1, 0, 0)), mode=Mode.SUBTRACT)

    # ThdSchPat: ThreadSchematic ×8
    with Locations(*[(i * THDSCHPAT_PITCH, 0, 0) for i in range(1, THDSCHPAT_COUNT)]):
        add(threadschematic, mode=Mode.SUBTRACT)


solid = part.part
